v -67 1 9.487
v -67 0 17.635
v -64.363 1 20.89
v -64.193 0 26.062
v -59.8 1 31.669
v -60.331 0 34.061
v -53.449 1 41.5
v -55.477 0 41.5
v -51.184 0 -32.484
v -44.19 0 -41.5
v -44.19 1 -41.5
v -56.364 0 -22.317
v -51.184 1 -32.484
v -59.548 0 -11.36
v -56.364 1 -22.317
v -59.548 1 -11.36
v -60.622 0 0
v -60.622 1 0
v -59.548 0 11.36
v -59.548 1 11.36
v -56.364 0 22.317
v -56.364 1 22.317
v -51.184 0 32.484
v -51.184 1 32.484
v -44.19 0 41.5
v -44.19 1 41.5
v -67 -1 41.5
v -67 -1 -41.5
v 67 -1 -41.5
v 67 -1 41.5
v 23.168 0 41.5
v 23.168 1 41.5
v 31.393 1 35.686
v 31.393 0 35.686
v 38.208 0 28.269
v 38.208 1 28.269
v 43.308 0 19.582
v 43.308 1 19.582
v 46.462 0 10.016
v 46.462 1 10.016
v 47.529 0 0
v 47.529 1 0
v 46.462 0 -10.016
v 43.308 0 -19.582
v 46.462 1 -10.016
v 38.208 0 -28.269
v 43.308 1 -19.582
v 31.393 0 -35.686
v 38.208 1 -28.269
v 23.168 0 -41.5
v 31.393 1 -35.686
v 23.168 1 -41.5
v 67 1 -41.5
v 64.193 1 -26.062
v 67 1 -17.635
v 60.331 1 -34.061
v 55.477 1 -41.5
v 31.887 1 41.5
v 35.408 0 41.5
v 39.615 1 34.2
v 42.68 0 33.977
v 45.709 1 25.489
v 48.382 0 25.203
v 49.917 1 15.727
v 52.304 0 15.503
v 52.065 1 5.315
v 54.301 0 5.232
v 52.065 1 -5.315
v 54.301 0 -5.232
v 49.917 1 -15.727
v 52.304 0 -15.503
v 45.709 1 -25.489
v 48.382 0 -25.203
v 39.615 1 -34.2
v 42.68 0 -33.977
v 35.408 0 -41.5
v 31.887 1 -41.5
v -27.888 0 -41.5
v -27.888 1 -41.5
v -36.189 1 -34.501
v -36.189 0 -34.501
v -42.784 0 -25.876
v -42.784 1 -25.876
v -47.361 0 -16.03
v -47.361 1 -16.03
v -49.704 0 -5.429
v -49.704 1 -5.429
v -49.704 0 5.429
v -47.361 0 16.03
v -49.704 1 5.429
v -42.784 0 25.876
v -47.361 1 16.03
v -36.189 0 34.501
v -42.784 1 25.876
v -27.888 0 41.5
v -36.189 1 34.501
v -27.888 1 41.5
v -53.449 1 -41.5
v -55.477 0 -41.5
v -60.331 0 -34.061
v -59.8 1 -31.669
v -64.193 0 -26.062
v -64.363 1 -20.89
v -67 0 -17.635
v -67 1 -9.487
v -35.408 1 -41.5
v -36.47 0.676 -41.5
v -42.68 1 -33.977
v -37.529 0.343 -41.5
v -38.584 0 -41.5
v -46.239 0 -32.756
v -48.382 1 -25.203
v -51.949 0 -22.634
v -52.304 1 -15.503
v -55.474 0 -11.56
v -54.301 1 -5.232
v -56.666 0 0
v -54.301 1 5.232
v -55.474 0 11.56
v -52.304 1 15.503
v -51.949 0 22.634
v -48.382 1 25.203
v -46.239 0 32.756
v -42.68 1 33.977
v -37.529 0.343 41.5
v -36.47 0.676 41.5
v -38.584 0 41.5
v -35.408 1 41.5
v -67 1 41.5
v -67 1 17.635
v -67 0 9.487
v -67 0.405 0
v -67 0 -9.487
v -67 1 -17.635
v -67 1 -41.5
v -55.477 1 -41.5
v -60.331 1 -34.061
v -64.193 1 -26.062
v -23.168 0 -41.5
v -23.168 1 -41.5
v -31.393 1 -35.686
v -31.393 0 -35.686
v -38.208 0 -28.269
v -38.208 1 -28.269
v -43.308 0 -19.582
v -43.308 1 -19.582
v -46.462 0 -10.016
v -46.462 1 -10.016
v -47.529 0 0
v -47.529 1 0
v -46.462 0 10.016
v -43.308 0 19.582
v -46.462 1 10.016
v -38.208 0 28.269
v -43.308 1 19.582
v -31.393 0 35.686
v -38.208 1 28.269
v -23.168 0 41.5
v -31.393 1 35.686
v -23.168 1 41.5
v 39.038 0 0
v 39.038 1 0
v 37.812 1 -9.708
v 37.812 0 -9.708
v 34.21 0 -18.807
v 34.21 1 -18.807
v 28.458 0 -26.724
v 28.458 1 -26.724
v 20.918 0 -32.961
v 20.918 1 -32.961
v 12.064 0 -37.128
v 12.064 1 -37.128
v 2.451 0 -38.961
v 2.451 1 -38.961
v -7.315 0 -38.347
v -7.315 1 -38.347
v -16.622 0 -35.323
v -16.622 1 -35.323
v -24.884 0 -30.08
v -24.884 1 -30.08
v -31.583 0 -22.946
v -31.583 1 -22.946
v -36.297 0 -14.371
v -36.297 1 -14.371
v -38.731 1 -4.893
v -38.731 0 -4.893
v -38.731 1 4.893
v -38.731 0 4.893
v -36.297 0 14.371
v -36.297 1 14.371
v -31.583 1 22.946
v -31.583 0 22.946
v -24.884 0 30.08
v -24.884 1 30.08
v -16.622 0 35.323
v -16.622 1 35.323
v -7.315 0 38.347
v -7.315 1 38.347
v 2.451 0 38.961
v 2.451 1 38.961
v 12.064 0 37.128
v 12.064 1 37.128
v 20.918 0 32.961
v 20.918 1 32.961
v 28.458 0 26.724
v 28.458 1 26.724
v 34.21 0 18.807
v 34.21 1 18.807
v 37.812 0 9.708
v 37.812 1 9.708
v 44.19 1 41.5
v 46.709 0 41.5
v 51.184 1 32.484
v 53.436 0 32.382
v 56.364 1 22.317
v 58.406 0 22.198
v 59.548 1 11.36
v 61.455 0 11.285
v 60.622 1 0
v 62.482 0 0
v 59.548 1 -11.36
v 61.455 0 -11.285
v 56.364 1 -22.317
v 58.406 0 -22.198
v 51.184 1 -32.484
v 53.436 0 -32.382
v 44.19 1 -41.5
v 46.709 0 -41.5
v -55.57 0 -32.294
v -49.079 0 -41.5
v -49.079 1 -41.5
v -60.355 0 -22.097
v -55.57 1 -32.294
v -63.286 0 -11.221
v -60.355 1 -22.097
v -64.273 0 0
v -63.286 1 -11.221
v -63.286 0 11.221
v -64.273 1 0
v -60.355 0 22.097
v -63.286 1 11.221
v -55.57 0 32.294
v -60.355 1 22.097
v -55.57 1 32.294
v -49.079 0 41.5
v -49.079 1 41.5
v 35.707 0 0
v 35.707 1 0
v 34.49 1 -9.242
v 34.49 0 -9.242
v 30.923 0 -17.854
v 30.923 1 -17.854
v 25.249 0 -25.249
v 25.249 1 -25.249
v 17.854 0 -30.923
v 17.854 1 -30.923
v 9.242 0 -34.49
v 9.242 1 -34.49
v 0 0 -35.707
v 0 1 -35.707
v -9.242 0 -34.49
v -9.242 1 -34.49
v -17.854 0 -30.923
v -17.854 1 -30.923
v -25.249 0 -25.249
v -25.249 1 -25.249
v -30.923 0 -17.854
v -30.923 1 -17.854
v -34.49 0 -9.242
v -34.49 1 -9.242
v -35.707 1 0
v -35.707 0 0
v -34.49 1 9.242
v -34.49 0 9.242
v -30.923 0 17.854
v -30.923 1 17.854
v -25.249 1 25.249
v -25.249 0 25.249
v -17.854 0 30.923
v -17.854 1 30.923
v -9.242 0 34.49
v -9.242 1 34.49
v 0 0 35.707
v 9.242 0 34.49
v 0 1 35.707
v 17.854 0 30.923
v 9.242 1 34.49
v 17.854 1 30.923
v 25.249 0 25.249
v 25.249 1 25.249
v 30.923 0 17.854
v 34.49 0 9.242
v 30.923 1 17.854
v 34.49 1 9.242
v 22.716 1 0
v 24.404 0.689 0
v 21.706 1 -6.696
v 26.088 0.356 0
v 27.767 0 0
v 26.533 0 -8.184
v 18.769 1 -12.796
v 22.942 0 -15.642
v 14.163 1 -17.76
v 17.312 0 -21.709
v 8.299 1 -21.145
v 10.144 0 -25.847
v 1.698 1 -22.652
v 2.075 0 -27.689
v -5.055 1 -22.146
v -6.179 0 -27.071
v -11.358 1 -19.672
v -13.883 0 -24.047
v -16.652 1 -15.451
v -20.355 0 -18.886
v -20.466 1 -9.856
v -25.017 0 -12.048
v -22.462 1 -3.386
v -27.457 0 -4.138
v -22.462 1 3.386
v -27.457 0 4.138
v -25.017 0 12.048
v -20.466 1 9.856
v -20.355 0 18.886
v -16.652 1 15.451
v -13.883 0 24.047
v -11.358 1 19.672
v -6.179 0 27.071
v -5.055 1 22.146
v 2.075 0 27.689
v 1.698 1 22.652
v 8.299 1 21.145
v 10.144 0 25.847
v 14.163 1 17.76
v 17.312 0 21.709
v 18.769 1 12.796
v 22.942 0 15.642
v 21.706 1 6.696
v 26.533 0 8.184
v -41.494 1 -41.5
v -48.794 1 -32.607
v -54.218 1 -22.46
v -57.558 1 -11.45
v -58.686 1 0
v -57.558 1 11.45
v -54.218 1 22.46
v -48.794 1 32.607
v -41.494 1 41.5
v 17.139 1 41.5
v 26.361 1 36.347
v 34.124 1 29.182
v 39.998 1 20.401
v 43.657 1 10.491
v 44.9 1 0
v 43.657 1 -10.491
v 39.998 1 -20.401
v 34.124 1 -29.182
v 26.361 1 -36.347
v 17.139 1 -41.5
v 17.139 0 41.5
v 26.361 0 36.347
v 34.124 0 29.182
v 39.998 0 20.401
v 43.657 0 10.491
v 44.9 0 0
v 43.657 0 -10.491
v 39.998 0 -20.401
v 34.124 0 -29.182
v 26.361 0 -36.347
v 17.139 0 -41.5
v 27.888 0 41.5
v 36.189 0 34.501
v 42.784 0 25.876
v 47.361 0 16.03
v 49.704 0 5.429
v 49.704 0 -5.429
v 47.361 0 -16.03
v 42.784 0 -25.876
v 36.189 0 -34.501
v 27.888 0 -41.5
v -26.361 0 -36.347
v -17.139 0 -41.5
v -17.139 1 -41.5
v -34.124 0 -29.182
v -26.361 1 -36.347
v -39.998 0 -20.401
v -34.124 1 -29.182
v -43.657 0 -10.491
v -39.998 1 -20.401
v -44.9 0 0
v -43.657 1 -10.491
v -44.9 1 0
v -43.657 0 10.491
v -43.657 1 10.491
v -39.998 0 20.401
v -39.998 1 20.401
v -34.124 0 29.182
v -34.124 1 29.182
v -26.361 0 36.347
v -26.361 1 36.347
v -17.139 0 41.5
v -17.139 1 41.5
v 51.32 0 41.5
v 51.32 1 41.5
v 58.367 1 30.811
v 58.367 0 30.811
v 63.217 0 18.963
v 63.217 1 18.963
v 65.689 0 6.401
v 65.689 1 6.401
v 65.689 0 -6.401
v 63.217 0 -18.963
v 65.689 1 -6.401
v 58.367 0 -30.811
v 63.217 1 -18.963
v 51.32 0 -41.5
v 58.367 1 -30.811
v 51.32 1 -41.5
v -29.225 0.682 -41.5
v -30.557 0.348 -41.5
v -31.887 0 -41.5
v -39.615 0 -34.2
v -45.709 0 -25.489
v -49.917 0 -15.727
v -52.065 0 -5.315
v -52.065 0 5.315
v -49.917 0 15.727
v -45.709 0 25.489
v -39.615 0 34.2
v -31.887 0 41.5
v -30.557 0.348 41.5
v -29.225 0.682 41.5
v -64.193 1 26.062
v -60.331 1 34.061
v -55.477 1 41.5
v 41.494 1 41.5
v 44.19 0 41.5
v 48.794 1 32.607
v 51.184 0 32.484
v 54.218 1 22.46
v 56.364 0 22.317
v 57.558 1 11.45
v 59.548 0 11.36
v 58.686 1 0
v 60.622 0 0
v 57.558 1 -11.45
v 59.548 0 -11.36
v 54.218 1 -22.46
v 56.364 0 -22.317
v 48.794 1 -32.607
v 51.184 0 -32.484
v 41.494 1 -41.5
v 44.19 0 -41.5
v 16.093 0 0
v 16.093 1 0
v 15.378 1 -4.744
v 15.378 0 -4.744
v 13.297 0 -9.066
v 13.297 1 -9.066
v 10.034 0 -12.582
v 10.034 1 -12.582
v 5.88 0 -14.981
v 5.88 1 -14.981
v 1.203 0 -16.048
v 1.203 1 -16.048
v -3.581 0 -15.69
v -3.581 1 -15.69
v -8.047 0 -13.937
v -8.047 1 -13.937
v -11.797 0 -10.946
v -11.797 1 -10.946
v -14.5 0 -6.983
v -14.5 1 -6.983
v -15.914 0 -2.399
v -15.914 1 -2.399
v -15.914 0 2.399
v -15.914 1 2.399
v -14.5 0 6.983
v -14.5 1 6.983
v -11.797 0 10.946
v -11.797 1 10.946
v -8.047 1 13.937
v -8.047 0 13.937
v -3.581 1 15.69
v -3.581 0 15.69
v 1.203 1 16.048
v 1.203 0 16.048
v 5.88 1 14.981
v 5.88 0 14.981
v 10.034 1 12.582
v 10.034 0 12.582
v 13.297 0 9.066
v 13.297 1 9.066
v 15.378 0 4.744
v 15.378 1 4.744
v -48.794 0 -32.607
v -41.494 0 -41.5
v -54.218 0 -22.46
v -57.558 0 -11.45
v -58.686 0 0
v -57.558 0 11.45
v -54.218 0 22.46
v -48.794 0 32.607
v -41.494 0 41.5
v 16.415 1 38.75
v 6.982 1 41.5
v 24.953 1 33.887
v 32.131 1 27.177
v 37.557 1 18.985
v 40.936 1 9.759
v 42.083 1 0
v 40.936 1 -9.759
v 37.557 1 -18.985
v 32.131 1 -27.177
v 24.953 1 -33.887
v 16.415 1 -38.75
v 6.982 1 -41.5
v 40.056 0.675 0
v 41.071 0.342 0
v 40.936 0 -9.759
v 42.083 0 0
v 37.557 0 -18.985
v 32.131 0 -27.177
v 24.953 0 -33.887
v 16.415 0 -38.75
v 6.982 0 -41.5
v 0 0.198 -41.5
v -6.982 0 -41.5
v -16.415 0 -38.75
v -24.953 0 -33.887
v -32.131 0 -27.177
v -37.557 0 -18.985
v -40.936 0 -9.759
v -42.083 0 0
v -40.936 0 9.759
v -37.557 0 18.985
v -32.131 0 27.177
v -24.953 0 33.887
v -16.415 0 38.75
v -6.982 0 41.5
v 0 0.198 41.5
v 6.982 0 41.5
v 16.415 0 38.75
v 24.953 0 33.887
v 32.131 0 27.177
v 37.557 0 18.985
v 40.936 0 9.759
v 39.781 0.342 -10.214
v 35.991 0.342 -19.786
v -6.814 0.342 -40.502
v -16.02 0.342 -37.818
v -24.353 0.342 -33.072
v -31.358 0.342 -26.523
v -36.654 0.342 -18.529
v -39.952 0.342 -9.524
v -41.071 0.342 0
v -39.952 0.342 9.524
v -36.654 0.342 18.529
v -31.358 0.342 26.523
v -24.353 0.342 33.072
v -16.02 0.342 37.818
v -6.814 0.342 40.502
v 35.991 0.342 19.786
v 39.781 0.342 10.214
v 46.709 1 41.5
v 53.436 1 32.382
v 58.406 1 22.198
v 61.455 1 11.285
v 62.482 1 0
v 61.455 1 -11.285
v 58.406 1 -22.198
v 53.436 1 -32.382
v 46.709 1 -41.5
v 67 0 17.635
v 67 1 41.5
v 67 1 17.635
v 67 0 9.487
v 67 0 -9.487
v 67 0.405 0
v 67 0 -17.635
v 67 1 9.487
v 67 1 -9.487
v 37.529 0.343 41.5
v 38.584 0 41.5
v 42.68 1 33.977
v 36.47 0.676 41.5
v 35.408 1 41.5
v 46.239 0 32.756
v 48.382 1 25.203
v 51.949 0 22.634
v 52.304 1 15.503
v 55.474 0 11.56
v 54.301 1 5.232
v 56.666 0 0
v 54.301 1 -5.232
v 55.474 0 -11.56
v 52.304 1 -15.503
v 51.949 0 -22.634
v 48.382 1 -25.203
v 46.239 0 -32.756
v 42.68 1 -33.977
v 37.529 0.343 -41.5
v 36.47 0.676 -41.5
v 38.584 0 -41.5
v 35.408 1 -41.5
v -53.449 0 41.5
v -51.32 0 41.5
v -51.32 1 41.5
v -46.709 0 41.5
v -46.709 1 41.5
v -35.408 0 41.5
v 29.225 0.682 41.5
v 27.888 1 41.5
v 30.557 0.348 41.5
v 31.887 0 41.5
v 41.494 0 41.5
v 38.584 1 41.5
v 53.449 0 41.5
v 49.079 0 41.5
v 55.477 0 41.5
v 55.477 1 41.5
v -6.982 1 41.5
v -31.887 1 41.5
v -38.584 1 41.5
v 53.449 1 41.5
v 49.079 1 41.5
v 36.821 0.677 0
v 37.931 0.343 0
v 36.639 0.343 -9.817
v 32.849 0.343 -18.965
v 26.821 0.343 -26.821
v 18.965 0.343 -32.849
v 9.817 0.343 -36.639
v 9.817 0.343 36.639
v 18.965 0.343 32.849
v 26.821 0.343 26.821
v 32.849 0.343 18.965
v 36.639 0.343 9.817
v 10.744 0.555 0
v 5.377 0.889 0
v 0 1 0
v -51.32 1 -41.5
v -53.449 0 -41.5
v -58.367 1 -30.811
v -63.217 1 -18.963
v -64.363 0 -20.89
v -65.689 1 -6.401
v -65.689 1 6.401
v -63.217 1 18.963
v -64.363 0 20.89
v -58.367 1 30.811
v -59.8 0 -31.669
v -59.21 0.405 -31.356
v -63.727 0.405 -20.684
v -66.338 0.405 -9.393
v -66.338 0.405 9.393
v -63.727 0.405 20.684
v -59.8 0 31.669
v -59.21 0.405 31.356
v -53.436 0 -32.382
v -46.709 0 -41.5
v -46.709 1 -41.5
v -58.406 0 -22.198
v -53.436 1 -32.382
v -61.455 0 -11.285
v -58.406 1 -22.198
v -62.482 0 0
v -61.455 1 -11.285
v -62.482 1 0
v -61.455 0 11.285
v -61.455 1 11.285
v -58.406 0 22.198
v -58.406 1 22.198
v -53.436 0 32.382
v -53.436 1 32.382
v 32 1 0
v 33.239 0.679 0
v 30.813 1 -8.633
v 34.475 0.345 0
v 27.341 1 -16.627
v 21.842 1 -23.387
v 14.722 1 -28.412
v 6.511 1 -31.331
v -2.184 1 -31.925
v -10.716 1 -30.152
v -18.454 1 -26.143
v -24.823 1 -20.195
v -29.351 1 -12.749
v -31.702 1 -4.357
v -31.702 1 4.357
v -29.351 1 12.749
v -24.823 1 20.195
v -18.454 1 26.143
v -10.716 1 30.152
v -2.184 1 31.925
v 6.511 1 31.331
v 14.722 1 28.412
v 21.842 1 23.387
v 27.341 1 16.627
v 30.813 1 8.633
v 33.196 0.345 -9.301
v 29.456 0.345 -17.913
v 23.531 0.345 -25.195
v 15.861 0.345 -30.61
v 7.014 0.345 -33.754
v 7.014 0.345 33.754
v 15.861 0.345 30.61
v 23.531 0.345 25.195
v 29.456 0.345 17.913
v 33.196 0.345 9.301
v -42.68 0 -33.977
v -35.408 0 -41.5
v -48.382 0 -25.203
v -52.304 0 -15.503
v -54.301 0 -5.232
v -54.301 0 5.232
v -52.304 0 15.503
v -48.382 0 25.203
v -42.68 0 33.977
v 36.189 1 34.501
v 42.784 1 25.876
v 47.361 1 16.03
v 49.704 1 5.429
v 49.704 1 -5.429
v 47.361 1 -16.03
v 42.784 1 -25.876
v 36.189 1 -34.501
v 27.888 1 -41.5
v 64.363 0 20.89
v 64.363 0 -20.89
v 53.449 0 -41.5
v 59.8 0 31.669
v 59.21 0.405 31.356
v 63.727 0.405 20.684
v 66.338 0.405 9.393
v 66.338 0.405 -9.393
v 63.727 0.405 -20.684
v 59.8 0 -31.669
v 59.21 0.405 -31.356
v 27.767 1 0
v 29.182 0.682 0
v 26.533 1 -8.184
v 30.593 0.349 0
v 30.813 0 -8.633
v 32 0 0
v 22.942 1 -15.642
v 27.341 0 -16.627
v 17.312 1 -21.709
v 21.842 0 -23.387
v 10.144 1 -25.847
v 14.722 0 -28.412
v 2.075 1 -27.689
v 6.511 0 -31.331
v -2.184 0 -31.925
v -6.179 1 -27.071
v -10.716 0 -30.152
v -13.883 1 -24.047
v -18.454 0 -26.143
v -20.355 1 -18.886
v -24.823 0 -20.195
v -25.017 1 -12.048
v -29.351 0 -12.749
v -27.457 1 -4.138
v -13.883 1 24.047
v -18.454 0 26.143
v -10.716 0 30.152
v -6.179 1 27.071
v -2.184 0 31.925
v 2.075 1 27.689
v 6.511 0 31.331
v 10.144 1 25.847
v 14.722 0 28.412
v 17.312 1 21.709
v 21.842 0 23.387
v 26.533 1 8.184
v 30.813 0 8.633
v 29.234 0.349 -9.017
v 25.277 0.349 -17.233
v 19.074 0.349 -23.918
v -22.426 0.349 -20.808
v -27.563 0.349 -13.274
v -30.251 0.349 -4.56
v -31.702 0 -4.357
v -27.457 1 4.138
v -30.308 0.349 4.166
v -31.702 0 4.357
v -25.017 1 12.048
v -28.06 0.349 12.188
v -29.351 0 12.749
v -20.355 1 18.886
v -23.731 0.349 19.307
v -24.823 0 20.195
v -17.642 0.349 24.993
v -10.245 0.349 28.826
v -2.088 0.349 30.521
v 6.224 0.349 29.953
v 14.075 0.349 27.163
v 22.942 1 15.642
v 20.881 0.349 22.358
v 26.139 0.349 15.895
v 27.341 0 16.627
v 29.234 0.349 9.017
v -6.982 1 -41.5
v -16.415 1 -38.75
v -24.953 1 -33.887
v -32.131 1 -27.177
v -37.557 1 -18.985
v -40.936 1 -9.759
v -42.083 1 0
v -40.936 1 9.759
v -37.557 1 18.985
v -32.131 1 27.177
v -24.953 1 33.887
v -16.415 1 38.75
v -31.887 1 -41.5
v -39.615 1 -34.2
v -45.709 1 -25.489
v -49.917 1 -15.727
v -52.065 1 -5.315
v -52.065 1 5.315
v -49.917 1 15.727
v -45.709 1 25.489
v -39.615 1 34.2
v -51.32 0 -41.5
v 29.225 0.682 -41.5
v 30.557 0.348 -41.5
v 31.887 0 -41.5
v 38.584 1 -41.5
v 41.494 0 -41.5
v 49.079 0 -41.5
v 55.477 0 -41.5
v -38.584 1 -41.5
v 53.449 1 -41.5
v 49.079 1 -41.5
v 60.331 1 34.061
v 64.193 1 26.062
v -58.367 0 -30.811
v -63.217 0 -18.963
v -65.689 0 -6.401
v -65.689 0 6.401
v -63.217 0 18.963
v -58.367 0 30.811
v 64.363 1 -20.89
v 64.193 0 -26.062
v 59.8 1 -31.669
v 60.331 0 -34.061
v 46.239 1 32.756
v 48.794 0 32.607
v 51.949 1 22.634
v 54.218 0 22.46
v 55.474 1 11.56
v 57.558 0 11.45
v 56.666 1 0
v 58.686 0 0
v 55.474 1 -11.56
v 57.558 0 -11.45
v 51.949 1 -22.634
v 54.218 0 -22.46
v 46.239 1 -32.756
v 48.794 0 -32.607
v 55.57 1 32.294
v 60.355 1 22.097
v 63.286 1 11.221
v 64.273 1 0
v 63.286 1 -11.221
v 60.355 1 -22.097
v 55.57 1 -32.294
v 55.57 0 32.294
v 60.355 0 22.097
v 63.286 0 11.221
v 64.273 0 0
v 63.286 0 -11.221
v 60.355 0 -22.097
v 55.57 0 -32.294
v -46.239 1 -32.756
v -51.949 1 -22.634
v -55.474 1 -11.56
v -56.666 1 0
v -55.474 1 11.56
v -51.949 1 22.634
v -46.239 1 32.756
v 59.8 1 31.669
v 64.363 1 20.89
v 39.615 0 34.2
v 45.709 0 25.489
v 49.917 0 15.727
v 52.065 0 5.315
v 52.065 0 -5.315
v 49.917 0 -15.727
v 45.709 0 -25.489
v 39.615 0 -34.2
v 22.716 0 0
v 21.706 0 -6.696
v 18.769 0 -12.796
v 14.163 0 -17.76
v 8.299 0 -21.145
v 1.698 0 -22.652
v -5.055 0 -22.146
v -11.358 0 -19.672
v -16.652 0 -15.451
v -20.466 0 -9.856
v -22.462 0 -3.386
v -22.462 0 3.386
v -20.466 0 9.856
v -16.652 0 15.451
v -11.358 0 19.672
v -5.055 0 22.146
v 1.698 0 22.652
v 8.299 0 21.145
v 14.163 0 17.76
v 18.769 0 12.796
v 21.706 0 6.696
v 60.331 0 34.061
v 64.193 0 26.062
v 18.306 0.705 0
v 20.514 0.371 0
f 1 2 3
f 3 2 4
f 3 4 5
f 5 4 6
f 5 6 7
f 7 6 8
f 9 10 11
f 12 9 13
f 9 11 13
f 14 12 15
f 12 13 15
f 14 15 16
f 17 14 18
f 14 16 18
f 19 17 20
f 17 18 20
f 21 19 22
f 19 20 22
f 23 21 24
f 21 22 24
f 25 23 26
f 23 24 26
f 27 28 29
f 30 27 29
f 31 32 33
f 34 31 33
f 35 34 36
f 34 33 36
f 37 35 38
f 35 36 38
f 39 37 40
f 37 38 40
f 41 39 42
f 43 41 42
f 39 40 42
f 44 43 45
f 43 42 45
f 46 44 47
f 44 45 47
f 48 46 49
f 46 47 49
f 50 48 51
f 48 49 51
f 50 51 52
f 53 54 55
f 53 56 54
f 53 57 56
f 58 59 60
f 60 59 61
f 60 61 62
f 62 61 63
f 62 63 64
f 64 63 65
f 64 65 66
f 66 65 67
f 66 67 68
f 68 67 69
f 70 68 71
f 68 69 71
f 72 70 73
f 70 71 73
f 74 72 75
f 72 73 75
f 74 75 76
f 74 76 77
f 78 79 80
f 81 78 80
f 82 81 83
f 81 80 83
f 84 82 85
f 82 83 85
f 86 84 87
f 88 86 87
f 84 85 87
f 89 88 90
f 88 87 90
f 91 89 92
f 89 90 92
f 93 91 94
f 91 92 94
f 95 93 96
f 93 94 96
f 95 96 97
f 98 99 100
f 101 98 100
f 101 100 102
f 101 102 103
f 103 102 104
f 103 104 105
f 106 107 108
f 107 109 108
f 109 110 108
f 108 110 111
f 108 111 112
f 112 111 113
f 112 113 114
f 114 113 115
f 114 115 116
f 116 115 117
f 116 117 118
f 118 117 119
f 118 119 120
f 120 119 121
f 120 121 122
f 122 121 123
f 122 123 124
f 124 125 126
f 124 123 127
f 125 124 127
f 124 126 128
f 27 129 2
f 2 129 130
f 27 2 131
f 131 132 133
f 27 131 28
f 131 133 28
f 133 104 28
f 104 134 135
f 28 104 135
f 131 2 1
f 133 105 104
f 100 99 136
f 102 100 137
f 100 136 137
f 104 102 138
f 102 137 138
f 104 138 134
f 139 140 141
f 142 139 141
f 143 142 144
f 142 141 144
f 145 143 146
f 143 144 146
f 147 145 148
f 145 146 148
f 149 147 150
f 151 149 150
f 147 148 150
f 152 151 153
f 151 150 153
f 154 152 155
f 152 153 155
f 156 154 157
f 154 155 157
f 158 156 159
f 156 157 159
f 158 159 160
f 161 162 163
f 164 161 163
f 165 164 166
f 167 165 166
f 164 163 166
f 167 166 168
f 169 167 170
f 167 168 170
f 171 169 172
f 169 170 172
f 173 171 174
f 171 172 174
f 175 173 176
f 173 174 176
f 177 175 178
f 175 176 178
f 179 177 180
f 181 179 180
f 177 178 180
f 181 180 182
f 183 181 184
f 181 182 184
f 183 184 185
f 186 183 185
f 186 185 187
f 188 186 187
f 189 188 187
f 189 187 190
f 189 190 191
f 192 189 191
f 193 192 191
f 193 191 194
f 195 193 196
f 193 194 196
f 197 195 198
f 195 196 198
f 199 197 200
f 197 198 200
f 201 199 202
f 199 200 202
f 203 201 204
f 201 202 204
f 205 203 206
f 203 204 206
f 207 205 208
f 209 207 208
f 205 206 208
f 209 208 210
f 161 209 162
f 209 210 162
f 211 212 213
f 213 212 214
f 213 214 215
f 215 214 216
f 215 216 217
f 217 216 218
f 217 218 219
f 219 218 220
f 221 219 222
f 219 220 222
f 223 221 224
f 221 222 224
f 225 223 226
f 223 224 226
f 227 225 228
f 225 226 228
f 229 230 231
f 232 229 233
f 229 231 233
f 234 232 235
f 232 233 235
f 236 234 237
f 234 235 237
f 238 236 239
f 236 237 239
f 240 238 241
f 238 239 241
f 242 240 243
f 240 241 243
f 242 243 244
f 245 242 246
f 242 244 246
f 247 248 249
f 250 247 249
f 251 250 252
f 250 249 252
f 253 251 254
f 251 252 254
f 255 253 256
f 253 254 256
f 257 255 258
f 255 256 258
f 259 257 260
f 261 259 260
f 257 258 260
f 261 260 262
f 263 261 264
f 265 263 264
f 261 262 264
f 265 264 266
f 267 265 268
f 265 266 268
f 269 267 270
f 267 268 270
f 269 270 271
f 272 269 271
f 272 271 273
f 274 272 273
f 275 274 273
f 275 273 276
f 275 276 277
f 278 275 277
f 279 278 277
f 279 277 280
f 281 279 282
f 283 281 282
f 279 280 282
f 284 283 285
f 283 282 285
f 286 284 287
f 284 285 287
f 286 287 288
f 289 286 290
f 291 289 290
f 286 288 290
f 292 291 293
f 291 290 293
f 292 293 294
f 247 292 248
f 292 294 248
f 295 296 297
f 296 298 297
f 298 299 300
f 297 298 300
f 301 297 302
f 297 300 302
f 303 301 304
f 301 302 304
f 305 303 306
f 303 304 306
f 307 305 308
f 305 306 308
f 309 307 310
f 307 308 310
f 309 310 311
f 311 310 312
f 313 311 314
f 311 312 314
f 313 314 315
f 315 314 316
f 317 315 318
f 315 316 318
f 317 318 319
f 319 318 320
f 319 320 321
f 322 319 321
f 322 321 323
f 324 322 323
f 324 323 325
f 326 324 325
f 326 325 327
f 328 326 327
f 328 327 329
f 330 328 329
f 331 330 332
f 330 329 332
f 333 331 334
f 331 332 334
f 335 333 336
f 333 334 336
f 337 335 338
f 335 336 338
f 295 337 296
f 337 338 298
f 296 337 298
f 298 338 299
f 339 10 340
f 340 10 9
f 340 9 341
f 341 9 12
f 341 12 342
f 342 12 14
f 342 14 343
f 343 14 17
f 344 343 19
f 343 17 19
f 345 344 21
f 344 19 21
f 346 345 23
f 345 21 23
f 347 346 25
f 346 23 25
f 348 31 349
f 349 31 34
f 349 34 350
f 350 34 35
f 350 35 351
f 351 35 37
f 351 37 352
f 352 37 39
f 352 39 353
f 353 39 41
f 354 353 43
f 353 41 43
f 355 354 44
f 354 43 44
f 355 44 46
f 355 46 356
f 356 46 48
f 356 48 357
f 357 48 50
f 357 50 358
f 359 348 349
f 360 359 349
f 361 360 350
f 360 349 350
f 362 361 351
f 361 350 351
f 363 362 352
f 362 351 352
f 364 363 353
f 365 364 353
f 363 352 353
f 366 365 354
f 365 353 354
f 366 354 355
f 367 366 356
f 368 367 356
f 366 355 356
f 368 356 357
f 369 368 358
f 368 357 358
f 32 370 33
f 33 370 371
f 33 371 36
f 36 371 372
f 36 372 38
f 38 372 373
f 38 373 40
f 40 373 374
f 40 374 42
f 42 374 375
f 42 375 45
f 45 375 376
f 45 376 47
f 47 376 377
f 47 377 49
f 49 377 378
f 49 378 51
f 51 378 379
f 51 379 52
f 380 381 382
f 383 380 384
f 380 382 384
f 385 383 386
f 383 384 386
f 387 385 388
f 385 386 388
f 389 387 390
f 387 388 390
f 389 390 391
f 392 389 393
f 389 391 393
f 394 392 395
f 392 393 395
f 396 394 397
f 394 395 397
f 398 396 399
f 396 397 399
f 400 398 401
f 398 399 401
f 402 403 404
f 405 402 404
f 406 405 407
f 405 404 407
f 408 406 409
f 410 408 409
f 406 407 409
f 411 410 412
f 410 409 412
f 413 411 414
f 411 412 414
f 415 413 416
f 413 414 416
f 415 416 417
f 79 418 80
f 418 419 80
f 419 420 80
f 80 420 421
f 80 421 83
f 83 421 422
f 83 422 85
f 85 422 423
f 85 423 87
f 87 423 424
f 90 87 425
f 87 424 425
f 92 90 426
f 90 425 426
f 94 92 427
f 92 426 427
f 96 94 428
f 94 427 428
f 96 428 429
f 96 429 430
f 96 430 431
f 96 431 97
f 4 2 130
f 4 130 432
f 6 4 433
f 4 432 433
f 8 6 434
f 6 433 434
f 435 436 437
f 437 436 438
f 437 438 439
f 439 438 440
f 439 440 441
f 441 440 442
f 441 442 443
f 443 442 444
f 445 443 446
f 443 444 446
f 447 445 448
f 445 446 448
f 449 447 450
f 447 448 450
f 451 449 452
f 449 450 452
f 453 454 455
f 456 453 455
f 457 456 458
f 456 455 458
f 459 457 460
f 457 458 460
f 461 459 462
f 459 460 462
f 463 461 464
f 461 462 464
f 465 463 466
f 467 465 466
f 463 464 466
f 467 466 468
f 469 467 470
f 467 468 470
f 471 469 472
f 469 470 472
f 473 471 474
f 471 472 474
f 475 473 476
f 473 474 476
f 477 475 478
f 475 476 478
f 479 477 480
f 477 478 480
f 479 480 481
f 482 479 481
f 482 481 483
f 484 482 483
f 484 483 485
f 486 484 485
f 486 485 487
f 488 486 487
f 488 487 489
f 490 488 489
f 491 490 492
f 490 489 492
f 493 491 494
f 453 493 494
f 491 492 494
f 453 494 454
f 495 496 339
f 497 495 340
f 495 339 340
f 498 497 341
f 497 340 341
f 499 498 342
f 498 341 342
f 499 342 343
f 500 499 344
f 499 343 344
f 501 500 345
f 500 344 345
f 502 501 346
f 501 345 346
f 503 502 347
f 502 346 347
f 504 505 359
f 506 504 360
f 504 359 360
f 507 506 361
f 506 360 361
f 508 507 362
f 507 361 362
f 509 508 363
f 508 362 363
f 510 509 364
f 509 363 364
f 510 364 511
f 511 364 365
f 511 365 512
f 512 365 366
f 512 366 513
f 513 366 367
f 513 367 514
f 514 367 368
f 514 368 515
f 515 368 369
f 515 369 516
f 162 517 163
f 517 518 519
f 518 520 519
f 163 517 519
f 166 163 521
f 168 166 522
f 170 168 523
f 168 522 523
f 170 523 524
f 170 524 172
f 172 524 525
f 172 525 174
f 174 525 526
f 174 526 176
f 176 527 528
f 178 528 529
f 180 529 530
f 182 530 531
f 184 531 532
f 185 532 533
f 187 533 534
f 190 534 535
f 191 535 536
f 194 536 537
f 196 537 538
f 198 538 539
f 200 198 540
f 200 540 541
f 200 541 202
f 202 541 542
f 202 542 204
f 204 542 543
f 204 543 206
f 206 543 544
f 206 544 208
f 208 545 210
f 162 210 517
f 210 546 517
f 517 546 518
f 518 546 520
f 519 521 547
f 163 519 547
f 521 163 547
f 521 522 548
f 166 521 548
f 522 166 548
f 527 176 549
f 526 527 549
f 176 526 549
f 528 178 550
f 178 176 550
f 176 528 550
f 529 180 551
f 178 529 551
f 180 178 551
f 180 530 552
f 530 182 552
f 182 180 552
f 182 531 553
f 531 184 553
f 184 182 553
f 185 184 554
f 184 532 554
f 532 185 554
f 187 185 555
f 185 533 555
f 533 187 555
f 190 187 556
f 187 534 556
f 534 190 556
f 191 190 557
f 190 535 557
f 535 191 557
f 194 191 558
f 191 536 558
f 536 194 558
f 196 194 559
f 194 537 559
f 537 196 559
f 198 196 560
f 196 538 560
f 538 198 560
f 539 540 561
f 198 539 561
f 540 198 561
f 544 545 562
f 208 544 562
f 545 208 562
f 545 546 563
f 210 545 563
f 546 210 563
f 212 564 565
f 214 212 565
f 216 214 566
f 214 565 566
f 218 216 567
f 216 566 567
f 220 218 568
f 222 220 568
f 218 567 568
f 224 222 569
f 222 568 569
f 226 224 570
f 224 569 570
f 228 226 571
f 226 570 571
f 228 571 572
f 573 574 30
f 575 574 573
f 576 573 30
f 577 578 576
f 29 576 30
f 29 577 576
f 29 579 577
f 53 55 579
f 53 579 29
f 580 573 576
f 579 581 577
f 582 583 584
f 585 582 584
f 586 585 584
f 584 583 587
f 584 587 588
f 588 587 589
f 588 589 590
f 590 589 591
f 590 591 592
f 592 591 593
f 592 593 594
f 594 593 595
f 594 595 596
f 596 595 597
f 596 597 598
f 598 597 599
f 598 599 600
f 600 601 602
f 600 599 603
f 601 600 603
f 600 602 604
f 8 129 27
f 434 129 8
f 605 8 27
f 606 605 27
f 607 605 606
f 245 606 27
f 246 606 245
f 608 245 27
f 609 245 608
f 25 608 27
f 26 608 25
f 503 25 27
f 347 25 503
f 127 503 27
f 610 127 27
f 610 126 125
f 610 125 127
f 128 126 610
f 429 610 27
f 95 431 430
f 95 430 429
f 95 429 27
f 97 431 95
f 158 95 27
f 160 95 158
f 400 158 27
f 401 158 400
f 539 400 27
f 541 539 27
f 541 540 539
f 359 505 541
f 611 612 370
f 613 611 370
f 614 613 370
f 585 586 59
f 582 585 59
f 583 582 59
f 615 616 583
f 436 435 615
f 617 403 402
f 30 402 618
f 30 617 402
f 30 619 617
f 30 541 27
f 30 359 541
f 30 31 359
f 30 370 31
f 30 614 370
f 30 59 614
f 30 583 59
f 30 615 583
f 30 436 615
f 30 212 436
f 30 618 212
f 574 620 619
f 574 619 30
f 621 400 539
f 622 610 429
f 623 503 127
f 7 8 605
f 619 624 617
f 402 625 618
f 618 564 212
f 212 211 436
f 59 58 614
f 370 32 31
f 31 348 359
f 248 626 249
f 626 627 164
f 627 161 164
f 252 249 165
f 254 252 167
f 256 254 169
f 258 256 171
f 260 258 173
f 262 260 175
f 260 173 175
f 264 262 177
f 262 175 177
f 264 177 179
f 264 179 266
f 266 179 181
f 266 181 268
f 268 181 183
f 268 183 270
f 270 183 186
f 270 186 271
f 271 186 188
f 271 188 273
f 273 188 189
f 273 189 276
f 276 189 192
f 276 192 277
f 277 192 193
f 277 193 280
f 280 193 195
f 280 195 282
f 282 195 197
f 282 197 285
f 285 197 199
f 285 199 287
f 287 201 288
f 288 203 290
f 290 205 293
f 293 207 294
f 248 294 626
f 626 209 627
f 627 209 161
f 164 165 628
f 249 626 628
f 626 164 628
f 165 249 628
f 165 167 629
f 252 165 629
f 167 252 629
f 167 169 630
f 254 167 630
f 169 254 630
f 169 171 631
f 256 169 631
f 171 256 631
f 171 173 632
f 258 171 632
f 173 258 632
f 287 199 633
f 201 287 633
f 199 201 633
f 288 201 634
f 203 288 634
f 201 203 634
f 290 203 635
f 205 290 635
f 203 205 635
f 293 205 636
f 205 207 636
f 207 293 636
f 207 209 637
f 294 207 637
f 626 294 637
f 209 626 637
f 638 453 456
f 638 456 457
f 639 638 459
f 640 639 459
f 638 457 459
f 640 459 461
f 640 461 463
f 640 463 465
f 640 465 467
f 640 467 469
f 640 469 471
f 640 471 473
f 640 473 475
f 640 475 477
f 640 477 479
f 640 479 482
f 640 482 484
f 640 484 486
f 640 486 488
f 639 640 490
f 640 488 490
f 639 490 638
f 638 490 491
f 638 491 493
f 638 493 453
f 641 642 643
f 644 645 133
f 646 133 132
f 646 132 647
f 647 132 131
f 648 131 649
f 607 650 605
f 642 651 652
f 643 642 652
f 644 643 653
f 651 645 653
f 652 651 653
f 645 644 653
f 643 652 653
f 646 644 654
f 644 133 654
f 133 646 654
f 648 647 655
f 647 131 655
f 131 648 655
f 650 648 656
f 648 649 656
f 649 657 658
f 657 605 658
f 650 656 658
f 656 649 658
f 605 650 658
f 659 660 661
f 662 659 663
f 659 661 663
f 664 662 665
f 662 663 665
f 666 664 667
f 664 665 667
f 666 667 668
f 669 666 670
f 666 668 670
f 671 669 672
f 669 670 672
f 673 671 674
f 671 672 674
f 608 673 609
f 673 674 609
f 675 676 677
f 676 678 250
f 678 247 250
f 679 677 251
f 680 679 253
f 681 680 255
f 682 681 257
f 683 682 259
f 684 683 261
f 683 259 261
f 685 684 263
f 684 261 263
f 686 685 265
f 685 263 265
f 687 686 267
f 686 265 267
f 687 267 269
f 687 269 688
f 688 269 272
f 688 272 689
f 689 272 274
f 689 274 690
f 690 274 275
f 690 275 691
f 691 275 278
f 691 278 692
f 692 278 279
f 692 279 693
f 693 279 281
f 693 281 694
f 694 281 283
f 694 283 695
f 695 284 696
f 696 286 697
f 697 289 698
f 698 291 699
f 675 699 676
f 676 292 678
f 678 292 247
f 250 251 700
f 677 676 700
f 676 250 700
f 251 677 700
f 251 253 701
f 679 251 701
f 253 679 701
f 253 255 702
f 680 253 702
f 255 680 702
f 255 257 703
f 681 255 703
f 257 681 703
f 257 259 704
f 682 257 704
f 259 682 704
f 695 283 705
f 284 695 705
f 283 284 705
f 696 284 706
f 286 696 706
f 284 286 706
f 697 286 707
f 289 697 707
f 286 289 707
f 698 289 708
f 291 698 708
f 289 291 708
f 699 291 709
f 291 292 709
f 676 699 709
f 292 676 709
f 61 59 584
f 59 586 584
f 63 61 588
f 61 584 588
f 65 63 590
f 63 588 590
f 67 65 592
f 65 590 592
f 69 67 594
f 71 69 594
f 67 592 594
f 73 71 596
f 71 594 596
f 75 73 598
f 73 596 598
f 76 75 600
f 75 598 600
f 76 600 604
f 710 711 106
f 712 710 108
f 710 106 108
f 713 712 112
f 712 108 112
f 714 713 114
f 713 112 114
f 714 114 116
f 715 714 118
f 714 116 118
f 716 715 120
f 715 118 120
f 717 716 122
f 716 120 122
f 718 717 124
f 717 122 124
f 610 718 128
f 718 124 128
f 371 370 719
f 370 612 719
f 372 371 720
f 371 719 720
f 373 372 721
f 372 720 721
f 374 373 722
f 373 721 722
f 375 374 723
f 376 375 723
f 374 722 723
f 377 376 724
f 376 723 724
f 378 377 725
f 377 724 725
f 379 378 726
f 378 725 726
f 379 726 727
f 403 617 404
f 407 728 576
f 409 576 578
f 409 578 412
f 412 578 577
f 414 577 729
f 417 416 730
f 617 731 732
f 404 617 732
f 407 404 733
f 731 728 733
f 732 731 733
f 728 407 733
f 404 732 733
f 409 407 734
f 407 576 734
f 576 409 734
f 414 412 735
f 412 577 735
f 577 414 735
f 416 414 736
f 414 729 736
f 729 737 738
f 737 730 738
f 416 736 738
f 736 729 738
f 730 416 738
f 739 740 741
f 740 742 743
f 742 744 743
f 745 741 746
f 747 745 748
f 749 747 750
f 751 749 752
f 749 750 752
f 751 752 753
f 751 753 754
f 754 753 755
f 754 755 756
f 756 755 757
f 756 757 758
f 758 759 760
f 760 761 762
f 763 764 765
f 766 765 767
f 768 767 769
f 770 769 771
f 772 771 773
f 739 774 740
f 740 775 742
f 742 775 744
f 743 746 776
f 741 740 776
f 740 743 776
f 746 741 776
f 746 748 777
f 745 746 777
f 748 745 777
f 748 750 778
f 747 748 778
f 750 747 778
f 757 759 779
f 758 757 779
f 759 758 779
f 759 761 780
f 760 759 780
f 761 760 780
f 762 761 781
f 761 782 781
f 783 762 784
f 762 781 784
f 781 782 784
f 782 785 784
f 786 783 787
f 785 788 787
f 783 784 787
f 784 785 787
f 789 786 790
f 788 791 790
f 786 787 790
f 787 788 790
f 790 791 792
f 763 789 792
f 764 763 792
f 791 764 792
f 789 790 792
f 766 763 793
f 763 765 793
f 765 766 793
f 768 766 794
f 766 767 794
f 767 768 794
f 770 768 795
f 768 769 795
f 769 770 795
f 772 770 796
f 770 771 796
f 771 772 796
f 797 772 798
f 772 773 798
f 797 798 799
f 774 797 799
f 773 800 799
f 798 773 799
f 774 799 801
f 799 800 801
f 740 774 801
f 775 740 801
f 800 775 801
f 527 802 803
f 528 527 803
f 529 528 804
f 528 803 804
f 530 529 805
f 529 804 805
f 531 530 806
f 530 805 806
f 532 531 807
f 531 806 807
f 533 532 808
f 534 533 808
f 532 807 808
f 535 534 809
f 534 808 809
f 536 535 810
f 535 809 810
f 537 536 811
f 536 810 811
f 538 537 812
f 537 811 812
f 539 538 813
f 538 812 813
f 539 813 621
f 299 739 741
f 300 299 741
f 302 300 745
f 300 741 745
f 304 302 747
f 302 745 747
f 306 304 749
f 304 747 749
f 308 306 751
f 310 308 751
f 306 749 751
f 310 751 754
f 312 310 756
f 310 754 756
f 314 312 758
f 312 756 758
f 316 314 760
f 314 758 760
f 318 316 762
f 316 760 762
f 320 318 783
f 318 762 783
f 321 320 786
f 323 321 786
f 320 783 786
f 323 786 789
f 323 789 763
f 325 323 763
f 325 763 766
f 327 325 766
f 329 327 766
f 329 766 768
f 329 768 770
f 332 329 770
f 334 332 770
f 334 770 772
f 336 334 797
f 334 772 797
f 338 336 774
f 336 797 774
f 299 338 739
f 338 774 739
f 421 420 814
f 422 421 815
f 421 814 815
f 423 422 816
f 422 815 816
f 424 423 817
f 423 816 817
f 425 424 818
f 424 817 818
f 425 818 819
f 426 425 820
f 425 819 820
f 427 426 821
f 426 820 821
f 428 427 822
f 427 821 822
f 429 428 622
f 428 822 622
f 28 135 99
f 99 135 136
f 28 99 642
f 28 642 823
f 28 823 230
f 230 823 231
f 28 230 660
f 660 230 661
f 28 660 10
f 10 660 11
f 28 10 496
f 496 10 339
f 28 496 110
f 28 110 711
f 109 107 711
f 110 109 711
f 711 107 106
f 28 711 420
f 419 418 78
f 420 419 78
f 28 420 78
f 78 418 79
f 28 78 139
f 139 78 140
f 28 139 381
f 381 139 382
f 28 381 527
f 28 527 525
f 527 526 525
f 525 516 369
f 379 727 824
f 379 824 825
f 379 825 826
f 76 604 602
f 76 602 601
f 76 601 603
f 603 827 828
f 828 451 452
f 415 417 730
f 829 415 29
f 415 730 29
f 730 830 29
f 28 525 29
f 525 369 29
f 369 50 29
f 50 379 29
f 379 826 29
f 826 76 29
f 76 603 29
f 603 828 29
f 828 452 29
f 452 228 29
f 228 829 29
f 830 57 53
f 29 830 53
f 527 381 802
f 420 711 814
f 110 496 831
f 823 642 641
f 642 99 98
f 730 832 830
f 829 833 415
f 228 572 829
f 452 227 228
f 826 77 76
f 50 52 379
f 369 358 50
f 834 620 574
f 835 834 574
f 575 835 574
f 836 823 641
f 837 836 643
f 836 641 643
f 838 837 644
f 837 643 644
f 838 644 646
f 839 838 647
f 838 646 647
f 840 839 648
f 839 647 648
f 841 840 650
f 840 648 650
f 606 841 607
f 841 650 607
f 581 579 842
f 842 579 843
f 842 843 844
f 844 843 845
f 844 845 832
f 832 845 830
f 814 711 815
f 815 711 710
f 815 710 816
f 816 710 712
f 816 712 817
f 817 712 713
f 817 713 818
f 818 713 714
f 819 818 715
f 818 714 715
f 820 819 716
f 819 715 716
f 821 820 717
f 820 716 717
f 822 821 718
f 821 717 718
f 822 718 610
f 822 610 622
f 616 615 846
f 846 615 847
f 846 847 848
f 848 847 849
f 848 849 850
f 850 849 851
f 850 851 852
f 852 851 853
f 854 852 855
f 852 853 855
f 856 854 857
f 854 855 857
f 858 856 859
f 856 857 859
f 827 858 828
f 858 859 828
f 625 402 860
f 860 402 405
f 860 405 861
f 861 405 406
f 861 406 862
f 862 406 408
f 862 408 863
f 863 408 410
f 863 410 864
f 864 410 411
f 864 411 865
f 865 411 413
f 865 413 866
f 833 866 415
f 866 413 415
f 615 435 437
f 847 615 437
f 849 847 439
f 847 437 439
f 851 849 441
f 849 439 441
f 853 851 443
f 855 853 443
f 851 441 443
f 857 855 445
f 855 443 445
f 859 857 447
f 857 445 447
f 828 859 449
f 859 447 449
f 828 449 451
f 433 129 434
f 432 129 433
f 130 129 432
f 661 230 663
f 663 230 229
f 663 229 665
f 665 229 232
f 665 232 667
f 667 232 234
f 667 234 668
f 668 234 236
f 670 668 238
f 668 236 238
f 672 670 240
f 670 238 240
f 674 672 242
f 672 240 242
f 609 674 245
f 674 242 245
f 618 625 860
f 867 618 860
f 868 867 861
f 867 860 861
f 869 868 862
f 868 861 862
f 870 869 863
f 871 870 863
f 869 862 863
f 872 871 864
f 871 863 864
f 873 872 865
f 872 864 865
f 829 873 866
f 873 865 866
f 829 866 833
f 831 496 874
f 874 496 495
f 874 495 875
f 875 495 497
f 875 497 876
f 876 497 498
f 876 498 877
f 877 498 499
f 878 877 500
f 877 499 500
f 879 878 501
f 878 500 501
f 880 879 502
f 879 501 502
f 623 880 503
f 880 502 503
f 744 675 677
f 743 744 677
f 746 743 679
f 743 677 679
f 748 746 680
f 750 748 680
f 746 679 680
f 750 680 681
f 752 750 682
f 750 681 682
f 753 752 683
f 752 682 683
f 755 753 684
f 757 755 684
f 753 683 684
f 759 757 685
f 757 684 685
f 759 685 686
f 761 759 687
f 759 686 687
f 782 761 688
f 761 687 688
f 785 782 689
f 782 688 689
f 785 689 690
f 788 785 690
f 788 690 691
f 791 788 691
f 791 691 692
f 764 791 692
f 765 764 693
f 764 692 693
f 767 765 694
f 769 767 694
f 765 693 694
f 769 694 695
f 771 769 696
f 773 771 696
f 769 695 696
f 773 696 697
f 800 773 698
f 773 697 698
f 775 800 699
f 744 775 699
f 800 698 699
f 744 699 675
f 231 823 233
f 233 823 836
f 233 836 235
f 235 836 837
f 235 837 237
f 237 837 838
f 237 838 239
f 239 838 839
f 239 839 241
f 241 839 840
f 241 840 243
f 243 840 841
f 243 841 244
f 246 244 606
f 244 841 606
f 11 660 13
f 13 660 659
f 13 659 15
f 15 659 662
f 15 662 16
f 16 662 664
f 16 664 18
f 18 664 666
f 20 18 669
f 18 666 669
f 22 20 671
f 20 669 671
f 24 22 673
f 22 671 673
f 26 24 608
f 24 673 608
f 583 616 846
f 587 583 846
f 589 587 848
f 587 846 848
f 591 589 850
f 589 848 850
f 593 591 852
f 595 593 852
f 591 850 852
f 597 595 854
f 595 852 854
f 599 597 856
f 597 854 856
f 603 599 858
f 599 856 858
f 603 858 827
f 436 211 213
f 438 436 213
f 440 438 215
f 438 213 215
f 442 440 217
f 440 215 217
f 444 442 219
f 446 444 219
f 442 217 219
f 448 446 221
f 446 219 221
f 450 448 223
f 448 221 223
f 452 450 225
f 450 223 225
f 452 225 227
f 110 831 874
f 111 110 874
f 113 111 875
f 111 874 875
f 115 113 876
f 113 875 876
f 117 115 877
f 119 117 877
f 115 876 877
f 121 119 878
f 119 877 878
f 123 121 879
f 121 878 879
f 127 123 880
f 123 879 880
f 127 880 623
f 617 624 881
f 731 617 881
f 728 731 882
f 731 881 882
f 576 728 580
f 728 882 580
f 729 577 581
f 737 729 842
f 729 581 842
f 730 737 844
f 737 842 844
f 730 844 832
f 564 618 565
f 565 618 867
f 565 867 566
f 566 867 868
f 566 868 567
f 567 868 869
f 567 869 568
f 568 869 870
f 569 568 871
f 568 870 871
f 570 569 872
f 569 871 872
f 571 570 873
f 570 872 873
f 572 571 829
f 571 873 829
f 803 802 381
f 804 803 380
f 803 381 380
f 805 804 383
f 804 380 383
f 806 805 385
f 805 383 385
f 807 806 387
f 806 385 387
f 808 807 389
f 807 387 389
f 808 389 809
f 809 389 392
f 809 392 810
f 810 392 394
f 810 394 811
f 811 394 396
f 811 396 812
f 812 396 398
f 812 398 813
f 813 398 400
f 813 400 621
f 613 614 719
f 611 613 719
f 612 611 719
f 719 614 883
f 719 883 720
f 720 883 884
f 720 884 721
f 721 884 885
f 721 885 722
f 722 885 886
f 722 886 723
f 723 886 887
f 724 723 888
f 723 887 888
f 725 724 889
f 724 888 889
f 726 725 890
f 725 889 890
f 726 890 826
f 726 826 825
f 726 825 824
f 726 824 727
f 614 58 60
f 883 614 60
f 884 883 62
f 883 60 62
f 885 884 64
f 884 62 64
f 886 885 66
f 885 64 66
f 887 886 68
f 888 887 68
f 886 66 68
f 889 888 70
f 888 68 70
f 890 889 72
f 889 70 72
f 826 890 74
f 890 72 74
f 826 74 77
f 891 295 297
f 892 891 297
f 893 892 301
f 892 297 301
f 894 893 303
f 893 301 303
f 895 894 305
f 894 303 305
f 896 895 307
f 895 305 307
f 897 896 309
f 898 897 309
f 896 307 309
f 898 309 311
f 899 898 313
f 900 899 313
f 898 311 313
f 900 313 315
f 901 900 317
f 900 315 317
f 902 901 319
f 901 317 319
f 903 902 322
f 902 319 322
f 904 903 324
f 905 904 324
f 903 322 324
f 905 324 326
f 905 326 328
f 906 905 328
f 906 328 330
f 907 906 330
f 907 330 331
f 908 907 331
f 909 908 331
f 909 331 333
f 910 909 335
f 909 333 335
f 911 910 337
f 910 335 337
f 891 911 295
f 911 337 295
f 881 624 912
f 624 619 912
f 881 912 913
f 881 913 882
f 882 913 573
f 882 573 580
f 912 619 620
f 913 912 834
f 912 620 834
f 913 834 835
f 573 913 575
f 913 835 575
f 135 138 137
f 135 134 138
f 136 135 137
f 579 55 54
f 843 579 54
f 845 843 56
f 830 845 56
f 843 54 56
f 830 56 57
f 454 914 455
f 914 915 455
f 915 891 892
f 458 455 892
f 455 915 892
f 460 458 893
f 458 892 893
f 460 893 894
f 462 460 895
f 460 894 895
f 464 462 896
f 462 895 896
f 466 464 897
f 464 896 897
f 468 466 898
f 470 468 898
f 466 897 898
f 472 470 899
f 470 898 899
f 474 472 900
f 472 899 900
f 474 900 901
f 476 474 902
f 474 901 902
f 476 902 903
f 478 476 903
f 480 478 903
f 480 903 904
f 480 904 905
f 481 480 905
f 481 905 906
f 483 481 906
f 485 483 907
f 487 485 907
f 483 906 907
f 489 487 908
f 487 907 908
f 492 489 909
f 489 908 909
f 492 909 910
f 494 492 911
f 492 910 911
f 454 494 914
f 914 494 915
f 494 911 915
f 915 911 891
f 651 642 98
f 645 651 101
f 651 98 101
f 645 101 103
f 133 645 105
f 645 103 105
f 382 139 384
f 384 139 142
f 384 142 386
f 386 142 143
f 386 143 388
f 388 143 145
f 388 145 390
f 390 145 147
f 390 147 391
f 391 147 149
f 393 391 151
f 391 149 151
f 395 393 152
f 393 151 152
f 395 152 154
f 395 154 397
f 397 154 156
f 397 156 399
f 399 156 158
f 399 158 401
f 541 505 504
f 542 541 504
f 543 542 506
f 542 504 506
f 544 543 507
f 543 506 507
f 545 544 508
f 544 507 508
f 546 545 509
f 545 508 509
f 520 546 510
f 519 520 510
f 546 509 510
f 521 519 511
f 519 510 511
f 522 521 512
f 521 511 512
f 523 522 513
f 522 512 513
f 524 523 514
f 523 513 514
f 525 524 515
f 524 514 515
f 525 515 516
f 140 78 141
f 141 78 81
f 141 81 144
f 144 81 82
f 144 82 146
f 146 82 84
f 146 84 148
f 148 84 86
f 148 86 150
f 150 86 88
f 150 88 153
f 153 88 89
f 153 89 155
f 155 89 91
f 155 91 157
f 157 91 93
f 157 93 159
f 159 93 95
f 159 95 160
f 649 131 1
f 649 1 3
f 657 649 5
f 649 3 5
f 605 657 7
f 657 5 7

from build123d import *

# Parameters (mm, degrees)
SKETCH1_W           = 134
SKETCH1_H           = 83
BOSS_EXTRUDE1_DEPTH = 1


with BuildPart() as part:
    # Sketch1 → Boss-Extrude1 (new, symmetric)
    with BuildSketch(Plane(origin=(0, 0, 0), x_dir=(1, 0, 0), z_dir=(0, 1, 0))):
        Rectangle(SKETCH1_W, SKETCH1_H)
    extrude(amount=BOSS_EXTRUDE1_DEPTH, both=True)

    # Sketch2 → Cut-Revolve2 (revolve, cut)
    with BuildSketch(Plane.XY):
        with BuildLine():
            ThreePointArc((0, 1), (8.062257748, 0.749759152), (16.093476939, 0))
            Line((16.093476939, 0), (16.093476939, 1))
            ThreePointArc((16.093476939, 1), (19.410995879, 0.542651439), (22.715633383, 0))
            Line((22.715633383, 0), (22.715633383, 1))
            ThreePointArc((22.715633383, 1), (25.246211792, 0.52501241), (27.766886754, 0))
            Line((27.766886754, 0), (27.766886754, 1))
            ThreePointArc((27.766886754, 1), (29.887626002, 0.517705527), (32, 0))
            Line((32, 0), (32, 1))
            ThreePointArc((32, 1), (33.857263243, 0.513687404), (35.707142143, 0))
            Line((35.707142143, 0), (35.707142143, 1))
            ThreePointArc((35.707142143, 1), (37.376136897, 0.511141633), (39.038442592, 0))
            Line((39.038442592, 0), (39.038442592, 1))
            ThreePointArc((39.038442592, 1), (40.563928381, 0.509383102), (42.083250825, 0))
            Line((42.083250825, 0), (42.083250825, 1))
            ThreePointArc((42.083250825, 1), (43.494443758, 0.508095088), (44.899888641, 0))
            Line((44.899888641, 0), (44.899888641, 1))
            ThreePointArc((44.899888641, 1), (46.217118302, 0.507110804), (47.528938553, 0))
            Line((47.528938553, 0), (47.528938553, 1))
            ThreePointArc((47.528938553, 1), (48.767032551, 0.506334009), (50, 0))
            Line((50, 0), (50, 1))
            ThreePointArc((50, 1), (51.170171104, 0.505705258), (52.335456433, 0))
            Line((52.335456433, 0), (52.335456433, 1))
            ThreePointArc((52.335456433, 1), (53.446430452, 0.505185844), (54.552726788, 0))
            Line((54.552726788, 0), (54.552726788, 1))
            ThreePointArc((54.552726788, 1), (55.611454311, 0.504749476), (56.665686266, 0))
            Line((56.665686266, 0), (56.665686266, 1))
            ThreePointArc((56.665686266, 1), (57.677811887, 0.504377668), (58.685603004, 0))
            Line((58.685603004, 0), (58.685603004, 1))
            ThreePointArc((58.685603004, 1), (59.655786026, 0.504057044), (60.621778265, 0))
            Line((60.621778265, 0), (60.621778265, 1))
            ThreePointArc((60.621778265, 1), (61.55391861, 0.503777684), (62.481997407, 0))
            Line((62.481997407, 0), (62.481997407, 1))
            ThreePointArc((62.481997407, 1), (63.379398912, 0.503532075), (64.272855857, 0))
            Line((64.272855857, 0), (64.272855857, 1))
            ThreePointArc((64.272855857, 1), (65.138346949, 0.503314425), (66, 0))
            Line((66, 0), (66, 1))
            ThreePointArc((66, 1), (66.836024616, 0.503120196), (67.668308683, 0))
            Line((67.668308683, 0), (67.668308683, 1))
            ThreePointArc((67.668308683, 1), (68.476995948, 0.50294578), (69.282032303, 0))
            Line((69.282032303, 0), (69.282032303, 2))
            Line((69.282032303, 2), (0, 2))
            Line((0, 2), (0, 1))
        make_face()
    revolve(axis=Axis((0, 0, 0), (0, 1, 0)), mode=Mode.SUBTRACT)


solid = part.part
